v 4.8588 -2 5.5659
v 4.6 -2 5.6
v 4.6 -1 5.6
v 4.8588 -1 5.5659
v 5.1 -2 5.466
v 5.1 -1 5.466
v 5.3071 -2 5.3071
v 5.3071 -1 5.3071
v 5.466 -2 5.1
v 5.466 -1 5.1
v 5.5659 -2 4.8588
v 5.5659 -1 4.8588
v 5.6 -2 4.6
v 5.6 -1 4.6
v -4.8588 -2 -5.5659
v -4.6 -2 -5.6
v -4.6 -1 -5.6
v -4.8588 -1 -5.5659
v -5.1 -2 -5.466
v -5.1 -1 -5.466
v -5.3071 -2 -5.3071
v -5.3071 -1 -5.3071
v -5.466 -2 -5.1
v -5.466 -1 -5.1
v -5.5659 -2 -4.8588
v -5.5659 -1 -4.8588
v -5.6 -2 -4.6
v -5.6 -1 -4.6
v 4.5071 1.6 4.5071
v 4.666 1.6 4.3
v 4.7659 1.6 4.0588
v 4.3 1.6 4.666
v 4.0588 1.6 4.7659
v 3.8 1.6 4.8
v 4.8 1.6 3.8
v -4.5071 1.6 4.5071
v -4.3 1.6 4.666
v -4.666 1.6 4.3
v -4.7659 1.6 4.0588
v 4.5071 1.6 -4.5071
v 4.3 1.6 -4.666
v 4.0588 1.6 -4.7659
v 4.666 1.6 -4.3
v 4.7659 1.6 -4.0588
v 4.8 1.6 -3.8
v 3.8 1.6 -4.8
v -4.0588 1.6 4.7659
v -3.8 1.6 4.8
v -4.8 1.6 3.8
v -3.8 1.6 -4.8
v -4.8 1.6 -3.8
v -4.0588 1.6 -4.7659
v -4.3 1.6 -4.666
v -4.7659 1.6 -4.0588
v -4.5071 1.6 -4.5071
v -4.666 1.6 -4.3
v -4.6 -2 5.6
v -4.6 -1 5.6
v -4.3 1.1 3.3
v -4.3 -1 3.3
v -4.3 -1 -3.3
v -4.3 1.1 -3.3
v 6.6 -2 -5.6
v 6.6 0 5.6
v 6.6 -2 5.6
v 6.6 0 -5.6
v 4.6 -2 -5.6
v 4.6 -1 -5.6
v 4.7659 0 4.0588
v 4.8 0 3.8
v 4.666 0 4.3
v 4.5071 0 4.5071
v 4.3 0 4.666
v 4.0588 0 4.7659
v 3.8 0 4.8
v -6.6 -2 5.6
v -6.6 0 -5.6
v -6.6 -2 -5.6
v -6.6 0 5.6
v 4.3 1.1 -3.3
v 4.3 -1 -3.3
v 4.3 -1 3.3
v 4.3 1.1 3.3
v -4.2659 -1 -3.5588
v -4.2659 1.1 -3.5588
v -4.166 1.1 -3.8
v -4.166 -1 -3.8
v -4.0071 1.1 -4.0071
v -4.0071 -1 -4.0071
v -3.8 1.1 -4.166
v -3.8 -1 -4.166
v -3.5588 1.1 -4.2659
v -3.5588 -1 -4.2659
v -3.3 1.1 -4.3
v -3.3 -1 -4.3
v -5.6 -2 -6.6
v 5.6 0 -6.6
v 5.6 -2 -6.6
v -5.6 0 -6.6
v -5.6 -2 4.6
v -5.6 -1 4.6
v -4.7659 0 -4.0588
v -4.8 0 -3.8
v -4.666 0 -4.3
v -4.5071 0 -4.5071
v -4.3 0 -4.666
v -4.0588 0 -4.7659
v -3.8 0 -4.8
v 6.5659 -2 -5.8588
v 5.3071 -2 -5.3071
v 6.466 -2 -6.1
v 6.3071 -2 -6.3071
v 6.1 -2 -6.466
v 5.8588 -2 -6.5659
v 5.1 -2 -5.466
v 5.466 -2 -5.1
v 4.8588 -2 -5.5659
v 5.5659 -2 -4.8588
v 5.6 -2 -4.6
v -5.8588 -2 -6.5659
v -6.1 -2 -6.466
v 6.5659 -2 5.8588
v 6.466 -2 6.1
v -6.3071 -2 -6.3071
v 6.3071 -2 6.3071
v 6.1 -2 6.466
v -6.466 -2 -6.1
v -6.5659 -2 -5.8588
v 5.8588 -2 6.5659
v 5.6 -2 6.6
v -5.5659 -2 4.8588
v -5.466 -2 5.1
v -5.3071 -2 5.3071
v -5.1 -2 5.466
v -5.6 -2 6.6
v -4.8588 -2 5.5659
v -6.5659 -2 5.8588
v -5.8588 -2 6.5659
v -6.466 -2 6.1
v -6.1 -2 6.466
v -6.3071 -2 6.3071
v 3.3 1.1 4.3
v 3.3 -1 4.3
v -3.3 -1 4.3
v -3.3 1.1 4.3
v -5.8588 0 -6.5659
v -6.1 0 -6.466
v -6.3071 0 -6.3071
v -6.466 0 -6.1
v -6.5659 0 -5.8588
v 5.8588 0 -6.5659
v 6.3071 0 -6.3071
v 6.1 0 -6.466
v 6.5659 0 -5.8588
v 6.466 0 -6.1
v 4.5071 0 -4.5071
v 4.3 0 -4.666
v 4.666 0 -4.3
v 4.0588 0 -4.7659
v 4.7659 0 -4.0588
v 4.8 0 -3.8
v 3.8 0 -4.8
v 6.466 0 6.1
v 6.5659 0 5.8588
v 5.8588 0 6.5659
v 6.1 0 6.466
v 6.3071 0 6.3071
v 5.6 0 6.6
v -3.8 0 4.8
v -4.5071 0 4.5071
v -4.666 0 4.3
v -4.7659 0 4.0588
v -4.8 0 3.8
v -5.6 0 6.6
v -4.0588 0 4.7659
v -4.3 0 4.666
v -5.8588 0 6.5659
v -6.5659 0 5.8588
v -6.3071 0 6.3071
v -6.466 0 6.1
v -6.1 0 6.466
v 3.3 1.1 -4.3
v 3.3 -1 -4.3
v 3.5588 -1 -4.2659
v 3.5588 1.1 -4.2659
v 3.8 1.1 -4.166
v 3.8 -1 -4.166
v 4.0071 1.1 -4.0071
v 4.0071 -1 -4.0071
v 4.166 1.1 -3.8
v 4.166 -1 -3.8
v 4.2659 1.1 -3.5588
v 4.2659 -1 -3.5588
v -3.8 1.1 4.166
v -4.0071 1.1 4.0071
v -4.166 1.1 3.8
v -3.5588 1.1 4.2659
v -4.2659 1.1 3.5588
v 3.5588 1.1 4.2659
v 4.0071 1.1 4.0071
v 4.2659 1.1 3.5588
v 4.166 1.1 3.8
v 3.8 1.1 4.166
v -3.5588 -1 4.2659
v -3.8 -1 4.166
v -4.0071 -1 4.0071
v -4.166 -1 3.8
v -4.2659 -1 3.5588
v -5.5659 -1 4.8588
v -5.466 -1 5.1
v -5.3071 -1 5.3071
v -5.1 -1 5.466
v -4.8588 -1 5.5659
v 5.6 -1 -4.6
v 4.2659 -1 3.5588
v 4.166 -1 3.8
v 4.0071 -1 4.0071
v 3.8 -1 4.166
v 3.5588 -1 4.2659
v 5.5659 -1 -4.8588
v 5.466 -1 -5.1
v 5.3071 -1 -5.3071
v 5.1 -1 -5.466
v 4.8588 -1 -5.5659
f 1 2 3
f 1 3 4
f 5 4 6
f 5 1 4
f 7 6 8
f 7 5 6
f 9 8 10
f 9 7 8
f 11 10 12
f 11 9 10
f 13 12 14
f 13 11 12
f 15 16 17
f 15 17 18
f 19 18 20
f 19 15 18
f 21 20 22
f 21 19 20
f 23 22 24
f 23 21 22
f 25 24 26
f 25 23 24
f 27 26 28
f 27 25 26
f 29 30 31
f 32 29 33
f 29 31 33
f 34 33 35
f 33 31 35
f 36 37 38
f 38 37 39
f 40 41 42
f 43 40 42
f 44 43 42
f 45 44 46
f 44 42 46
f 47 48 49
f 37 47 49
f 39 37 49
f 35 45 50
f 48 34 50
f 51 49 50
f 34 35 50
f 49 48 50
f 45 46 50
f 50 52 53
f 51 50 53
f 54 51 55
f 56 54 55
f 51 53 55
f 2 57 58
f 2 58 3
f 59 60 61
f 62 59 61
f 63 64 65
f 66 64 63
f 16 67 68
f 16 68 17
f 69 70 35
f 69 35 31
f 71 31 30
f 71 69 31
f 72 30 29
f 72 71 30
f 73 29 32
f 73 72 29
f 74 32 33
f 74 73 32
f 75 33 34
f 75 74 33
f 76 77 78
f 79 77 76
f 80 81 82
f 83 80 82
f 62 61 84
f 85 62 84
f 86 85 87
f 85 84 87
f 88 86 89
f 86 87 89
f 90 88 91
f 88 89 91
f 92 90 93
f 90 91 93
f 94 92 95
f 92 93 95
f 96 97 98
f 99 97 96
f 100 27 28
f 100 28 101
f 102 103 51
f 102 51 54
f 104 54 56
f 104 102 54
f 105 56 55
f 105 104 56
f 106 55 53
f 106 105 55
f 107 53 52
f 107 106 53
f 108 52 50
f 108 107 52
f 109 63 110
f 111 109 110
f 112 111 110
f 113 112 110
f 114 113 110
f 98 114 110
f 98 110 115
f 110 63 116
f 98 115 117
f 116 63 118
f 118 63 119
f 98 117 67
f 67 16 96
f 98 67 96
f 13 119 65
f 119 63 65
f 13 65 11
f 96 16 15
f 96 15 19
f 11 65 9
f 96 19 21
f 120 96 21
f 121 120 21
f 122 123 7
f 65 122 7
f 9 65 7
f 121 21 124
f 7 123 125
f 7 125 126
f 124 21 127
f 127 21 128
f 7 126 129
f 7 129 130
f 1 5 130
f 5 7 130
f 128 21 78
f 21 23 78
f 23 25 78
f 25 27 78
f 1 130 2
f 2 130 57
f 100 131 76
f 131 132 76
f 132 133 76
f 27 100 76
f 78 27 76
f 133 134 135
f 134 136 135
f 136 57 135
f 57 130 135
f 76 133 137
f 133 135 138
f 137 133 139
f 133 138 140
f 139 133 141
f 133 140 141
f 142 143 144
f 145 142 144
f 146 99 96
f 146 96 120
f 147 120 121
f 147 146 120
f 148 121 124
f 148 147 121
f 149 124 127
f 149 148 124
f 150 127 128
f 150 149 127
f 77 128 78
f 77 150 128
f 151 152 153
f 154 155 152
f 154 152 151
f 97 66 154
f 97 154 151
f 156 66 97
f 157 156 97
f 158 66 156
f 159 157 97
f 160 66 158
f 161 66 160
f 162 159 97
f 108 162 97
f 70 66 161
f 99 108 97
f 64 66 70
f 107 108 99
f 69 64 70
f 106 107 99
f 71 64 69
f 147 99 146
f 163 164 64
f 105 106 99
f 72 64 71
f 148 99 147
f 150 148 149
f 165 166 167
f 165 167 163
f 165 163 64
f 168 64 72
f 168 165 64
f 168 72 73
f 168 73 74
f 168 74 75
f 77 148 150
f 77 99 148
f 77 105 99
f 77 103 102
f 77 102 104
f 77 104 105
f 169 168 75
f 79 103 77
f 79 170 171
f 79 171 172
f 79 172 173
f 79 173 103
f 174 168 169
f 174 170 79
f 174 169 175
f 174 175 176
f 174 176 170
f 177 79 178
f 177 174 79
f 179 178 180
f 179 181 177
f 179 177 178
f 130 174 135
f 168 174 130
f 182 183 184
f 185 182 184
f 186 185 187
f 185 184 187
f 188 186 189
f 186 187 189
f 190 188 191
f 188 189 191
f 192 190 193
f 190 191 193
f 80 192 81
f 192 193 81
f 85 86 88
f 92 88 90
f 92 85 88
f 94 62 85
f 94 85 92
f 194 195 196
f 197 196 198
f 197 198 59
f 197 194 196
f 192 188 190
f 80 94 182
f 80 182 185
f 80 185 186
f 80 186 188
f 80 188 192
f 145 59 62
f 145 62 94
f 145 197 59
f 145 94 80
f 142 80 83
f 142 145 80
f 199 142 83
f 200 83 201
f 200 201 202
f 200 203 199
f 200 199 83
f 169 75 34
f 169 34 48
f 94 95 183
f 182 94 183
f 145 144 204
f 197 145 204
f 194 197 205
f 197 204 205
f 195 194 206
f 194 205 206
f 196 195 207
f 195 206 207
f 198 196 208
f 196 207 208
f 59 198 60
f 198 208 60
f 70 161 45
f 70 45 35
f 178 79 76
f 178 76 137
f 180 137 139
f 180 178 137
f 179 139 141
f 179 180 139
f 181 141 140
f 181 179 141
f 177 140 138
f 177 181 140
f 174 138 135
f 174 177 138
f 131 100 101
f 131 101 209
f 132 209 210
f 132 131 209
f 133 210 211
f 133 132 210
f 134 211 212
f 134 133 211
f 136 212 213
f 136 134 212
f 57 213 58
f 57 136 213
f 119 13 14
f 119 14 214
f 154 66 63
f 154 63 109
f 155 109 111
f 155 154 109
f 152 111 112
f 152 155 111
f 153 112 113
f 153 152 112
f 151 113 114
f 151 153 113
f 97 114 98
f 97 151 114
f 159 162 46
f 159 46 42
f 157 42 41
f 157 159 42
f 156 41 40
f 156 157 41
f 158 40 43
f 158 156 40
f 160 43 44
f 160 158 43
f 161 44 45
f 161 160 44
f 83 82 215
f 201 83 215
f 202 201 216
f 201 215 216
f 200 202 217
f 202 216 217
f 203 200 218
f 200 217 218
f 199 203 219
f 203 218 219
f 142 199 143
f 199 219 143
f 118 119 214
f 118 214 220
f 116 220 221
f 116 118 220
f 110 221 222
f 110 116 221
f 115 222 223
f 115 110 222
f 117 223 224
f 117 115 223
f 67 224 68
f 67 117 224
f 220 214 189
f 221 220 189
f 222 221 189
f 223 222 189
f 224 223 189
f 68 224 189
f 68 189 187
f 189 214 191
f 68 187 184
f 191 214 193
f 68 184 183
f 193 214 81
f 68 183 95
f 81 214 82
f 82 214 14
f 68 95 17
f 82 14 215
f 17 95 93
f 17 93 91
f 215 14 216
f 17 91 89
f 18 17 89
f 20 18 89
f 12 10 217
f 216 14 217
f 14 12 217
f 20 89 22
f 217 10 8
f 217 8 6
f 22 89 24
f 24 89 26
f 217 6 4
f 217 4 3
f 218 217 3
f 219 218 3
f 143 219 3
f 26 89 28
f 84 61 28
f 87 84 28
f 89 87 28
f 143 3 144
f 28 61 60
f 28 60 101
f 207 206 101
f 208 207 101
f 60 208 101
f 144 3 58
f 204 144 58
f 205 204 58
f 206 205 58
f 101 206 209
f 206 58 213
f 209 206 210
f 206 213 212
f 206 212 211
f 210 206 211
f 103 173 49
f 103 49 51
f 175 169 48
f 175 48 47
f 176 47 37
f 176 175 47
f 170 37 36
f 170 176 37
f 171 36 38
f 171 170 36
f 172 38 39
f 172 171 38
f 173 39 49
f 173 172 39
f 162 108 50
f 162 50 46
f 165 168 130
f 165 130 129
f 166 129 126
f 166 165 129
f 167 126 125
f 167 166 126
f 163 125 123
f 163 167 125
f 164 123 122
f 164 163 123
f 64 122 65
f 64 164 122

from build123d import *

# Parameters (mm, degrees)
EXTRUDE_1_DEPTH     = 1.6
EXTRUDE_2_DEPTH     = 2
CUT_EXTRUDE_1_DEPTH = 3.1
CUT_EXTRUDE_2_DEPTH = 1


with BuildPart() as part:
    # 草图1 → 凸台-拉伸1 (new body)
    with BuildSketch(Plane(origin=(0, 0, 0), x_dir=(1, 0, 0), z_dir=(0, 1, 0))):
        with BuildLine():
            Line((-3.8, 4.8), (3.8, 4.8))
            ThreePointArc((3.8, 4.8), (4.507106781, 4.507106781), (4.8, 3.8))
            Line((4.8, 3.8), (4.8, -3.8))
            ThreePointArc((4.8, -3.8), (4.507106781, -4.507106781), (3.8, -4.8))
            Line((3.8, -4.8), (-3.8, -4.8))
            ThreePointArc((-3.8, -4.8), (-4.507106781, -4.507106781), (-4.8, -3.8))
            Line((-4.8, -3.8), (-4.8, 3.8))
            ThreePointArc((-4.8, 3.8), (-4.507106781, 4.507106781), (-3.8, 4.8))
        make_face()
    extrude(amount=EXTRUDE_1_DEPTH)

    # 草图2 → 凸台-拉伸2 (add)
    with BuildSketch(Plane.XZ):
        with BuildLine():
            Line((-5.6, 6.6), (5.6, 6.6))
            ThreePointArc((5.6, 6.6), (6.307106781, 6.307106781), (6.6, 5.6))
            Line((6.6, 5.6), (6.6, -5.6))
            ThreePointArc((6.6, -5.6), (6.307106781, -6.307106781), (5.6, -6.6))
            Line((5.6, -6.6), (-5.6, -6.6))
            ThreePointArc((-5.6, -6.6), (-6.307106781, -6.307106781), (-6.6, -5.6))
            Line((-6.6, -5.6), (-6.6, 5.6))
            ThreePointArc((-6.6, 5.6), (-6.307106781, 6.307106781), (-5.6, 6.6))
        make_face()
    extrude(amount=EXTRUDE_2_DEPTH)

    # 草图3 → 切除-拉伸1 (cut)
    with BuildSketch(Plane.XZ.offset(2)):
        with BuildLine():
            Line((-3.3, -4.3), (3.3, -4.3))
            ThreePointArc((3.3, -4.3), (4.007106781, -4.007106781), (4.3, -3.3))
            Line((4.3, -3.3), (4.3, 3.3))
            ThreePointArc((4.3, 3.3), (4.007106781, 4.007106781), (3.3, 4.3))
            Line((3.3, 4.3), (-3.3, 4.3))
            ThreePointArc((-3.3, 4.3), (-4.007106781, 4.007106781), (-4.3, 3.3))
            Line((-4.3, 3.3), (-4.3, -3.3))
            ThreePointArc((-4.3, -3.3), (-4.007106781, -4.007106781), (-3.3, -4.3))
        make_face()
    extrude(amount=-CUT_EXTRUDE_1_DEPTH, mode=Mode.SUBTRACT)

    # 草图4 → 切除-拉伸2 (cut)
    with BuildSketch(Plane.XZ.offset(2)):
        with BuildLine():
            Line((-4.6, 5.6), (4.6, 5.6))
            ThreePointArc((4.6, 5.6), (5.307106781, 5.307106781), (5.6, 4.6))
            Line((5.6, 4.6), (5.6, -4.6))
            ThreePointArc((5.6, -4.6), (5.307106781, -5.307106781), (4.6, -5.6))
            Line((4.6, -5.6), (-4.6, -5.6))
            ThreePointArc((-4.6, -5.6), (-5.307106781, -5.307106781), (-5.6, -4.6))
            Line((-5.6, -4.6), (-5.6, 4.6))
            ThreePointArc((-5.6, 4.6), (-5.307106781, 5.307106781), (-4.6, 5.6))
        make_face()
    extrude(amount=-CUT_EXTRUDE_2_DEPTH, mode=Mode.SUBTRACT)


solid = part.part
